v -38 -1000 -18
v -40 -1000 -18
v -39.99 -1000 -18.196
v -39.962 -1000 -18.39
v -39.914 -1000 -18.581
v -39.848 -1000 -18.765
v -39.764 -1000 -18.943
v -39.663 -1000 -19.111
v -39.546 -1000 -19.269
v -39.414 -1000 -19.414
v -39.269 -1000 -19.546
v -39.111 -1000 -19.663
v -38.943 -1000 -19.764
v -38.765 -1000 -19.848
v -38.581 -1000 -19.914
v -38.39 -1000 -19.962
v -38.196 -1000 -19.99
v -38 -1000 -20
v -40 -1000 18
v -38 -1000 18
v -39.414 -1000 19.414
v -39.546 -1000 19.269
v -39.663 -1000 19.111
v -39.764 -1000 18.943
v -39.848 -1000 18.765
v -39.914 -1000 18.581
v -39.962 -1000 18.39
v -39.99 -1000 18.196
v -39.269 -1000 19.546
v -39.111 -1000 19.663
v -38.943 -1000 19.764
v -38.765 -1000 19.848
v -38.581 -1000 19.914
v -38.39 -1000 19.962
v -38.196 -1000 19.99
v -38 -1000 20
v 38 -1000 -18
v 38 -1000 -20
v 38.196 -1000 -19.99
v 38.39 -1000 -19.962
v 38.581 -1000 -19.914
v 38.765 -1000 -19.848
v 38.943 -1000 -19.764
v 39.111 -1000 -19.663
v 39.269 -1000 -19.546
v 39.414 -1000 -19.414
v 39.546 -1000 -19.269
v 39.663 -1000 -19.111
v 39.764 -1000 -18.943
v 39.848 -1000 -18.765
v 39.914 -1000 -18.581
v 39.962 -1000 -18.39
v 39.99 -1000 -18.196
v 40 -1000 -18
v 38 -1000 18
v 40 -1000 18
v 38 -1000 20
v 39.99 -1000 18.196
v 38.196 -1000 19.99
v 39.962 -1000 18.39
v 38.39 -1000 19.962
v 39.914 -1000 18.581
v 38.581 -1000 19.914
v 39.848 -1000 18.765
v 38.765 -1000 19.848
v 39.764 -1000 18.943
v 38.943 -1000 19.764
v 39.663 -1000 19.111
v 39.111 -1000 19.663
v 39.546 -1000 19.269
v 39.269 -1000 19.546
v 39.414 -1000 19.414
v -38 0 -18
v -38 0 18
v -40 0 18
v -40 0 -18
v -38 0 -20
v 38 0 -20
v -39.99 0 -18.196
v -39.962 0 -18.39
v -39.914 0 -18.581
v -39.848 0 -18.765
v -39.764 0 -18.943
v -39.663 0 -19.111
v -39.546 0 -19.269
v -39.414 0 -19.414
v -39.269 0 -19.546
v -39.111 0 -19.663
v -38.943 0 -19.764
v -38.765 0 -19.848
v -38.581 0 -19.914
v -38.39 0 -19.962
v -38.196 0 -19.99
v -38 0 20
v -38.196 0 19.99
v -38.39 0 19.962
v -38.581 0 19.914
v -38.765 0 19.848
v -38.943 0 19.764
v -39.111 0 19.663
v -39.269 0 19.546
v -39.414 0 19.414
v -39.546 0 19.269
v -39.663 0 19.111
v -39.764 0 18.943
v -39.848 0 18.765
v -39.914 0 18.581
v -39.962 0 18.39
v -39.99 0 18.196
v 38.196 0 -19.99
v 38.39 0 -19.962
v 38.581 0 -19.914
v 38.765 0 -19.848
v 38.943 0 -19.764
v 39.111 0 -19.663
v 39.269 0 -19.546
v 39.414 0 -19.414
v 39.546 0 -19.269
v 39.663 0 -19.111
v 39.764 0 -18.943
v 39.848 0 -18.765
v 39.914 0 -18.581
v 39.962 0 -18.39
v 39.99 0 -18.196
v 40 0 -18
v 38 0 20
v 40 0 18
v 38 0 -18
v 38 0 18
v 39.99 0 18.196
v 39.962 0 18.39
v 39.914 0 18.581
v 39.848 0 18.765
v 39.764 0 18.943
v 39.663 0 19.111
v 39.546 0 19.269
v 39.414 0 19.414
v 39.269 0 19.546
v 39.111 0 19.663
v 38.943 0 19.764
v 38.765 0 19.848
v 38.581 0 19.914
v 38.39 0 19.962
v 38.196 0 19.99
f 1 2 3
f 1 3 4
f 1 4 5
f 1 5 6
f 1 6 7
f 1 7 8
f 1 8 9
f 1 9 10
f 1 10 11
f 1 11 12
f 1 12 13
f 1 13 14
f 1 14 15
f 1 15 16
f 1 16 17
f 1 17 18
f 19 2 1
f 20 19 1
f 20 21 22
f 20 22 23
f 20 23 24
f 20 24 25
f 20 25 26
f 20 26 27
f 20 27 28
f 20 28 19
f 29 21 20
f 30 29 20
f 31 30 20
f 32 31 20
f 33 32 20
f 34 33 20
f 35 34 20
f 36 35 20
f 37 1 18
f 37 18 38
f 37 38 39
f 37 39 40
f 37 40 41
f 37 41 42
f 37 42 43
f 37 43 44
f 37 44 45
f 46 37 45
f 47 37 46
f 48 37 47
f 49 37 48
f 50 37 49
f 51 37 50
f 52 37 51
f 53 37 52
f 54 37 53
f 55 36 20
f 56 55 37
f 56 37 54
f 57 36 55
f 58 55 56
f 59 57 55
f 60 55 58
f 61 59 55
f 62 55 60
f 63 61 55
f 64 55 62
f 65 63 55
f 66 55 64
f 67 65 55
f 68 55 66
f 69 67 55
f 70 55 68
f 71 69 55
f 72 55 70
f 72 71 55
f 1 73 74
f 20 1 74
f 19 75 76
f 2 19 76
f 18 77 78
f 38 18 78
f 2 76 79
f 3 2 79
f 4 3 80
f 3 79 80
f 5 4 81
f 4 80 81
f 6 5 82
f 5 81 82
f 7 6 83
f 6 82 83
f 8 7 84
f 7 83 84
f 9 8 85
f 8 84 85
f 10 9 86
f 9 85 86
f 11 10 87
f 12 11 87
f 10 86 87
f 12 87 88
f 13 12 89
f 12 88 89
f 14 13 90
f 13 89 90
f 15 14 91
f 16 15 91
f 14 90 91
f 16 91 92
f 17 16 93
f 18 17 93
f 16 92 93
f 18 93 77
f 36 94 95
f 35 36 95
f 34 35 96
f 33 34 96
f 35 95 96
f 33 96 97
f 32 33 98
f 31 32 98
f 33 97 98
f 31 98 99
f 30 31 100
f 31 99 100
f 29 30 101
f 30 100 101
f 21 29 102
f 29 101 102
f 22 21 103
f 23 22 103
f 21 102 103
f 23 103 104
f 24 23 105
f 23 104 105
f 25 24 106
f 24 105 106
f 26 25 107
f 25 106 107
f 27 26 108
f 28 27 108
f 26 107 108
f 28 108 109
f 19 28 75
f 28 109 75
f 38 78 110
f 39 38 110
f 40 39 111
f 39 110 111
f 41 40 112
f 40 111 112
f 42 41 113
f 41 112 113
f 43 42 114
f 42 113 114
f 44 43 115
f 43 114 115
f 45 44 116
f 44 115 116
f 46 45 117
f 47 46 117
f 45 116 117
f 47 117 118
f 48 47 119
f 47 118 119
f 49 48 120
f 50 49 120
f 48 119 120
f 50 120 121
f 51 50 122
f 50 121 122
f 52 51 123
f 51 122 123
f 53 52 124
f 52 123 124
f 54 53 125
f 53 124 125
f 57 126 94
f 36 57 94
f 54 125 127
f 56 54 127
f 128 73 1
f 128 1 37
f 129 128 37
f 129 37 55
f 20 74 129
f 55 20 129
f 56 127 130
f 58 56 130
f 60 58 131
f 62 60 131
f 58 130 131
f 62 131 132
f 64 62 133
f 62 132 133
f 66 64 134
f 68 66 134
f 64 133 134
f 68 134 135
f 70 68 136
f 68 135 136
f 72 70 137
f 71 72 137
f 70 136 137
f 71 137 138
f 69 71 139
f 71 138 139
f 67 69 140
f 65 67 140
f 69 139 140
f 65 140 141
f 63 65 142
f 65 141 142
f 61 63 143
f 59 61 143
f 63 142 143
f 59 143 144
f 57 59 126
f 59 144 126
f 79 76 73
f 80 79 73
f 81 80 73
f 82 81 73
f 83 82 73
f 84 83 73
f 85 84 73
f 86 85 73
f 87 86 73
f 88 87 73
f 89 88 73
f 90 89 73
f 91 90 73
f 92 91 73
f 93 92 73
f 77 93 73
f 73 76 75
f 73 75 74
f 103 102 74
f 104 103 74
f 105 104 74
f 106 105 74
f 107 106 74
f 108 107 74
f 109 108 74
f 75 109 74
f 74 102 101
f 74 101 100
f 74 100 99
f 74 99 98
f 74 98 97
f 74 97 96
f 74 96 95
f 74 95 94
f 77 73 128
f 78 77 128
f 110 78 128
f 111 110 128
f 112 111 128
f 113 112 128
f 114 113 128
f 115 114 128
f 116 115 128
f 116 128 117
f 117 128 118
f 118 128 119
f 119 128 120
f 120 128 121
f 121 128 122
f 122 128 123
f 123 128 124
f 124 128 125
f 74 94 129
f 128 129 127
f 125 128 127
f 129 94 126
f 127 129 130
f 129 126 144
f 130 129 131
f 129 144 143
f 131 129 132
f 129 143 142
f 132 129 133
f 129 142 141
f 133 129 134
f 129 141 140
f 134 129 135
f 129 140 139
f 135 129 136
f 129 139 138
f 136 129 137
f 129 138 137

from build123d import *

# Parameters (mm, degrees)
F0_W     = 76
F0_H     = 36
F1_DEPTH = 1000


# Not quite as in the source:
# - ends of sketch curves that miss each other by under 0.0002 mm in the source are joined


with BuildPart() as f1:
    # F0 (on Front) → F1 (new body)
    with BuildSketch(Plane.XZ):
        with BuildLine():
            ThreePointArc((-37.999999, 20), (-39.4142135624, 19.4142135624), (-40, 17.999999))
            Line((-40, 17.999999), (-40, -18))
            ThreePointArc((-40, -18), (-39.4142128553, -19.4142142695), (-37.999999, -20))
            Line((-37.999999, -20), (38, -20))
            ThreePointArc((38, -20), (39.4142139159, -19.4142132088), (40, -18))
            Line((40, -18), (40, 18))
            ThreePointArc((40, 18), (39.4142139159, 19.4142132088), (38.000001, 20))
            Line((38.000001, 20), (-37.999999, 20))
        make_face()
        Rectangle(F0_W, F0_H, mode=Mode.SUBTRACT)
    extrude(amount=F1_DEPTH)


solid = f1.part
